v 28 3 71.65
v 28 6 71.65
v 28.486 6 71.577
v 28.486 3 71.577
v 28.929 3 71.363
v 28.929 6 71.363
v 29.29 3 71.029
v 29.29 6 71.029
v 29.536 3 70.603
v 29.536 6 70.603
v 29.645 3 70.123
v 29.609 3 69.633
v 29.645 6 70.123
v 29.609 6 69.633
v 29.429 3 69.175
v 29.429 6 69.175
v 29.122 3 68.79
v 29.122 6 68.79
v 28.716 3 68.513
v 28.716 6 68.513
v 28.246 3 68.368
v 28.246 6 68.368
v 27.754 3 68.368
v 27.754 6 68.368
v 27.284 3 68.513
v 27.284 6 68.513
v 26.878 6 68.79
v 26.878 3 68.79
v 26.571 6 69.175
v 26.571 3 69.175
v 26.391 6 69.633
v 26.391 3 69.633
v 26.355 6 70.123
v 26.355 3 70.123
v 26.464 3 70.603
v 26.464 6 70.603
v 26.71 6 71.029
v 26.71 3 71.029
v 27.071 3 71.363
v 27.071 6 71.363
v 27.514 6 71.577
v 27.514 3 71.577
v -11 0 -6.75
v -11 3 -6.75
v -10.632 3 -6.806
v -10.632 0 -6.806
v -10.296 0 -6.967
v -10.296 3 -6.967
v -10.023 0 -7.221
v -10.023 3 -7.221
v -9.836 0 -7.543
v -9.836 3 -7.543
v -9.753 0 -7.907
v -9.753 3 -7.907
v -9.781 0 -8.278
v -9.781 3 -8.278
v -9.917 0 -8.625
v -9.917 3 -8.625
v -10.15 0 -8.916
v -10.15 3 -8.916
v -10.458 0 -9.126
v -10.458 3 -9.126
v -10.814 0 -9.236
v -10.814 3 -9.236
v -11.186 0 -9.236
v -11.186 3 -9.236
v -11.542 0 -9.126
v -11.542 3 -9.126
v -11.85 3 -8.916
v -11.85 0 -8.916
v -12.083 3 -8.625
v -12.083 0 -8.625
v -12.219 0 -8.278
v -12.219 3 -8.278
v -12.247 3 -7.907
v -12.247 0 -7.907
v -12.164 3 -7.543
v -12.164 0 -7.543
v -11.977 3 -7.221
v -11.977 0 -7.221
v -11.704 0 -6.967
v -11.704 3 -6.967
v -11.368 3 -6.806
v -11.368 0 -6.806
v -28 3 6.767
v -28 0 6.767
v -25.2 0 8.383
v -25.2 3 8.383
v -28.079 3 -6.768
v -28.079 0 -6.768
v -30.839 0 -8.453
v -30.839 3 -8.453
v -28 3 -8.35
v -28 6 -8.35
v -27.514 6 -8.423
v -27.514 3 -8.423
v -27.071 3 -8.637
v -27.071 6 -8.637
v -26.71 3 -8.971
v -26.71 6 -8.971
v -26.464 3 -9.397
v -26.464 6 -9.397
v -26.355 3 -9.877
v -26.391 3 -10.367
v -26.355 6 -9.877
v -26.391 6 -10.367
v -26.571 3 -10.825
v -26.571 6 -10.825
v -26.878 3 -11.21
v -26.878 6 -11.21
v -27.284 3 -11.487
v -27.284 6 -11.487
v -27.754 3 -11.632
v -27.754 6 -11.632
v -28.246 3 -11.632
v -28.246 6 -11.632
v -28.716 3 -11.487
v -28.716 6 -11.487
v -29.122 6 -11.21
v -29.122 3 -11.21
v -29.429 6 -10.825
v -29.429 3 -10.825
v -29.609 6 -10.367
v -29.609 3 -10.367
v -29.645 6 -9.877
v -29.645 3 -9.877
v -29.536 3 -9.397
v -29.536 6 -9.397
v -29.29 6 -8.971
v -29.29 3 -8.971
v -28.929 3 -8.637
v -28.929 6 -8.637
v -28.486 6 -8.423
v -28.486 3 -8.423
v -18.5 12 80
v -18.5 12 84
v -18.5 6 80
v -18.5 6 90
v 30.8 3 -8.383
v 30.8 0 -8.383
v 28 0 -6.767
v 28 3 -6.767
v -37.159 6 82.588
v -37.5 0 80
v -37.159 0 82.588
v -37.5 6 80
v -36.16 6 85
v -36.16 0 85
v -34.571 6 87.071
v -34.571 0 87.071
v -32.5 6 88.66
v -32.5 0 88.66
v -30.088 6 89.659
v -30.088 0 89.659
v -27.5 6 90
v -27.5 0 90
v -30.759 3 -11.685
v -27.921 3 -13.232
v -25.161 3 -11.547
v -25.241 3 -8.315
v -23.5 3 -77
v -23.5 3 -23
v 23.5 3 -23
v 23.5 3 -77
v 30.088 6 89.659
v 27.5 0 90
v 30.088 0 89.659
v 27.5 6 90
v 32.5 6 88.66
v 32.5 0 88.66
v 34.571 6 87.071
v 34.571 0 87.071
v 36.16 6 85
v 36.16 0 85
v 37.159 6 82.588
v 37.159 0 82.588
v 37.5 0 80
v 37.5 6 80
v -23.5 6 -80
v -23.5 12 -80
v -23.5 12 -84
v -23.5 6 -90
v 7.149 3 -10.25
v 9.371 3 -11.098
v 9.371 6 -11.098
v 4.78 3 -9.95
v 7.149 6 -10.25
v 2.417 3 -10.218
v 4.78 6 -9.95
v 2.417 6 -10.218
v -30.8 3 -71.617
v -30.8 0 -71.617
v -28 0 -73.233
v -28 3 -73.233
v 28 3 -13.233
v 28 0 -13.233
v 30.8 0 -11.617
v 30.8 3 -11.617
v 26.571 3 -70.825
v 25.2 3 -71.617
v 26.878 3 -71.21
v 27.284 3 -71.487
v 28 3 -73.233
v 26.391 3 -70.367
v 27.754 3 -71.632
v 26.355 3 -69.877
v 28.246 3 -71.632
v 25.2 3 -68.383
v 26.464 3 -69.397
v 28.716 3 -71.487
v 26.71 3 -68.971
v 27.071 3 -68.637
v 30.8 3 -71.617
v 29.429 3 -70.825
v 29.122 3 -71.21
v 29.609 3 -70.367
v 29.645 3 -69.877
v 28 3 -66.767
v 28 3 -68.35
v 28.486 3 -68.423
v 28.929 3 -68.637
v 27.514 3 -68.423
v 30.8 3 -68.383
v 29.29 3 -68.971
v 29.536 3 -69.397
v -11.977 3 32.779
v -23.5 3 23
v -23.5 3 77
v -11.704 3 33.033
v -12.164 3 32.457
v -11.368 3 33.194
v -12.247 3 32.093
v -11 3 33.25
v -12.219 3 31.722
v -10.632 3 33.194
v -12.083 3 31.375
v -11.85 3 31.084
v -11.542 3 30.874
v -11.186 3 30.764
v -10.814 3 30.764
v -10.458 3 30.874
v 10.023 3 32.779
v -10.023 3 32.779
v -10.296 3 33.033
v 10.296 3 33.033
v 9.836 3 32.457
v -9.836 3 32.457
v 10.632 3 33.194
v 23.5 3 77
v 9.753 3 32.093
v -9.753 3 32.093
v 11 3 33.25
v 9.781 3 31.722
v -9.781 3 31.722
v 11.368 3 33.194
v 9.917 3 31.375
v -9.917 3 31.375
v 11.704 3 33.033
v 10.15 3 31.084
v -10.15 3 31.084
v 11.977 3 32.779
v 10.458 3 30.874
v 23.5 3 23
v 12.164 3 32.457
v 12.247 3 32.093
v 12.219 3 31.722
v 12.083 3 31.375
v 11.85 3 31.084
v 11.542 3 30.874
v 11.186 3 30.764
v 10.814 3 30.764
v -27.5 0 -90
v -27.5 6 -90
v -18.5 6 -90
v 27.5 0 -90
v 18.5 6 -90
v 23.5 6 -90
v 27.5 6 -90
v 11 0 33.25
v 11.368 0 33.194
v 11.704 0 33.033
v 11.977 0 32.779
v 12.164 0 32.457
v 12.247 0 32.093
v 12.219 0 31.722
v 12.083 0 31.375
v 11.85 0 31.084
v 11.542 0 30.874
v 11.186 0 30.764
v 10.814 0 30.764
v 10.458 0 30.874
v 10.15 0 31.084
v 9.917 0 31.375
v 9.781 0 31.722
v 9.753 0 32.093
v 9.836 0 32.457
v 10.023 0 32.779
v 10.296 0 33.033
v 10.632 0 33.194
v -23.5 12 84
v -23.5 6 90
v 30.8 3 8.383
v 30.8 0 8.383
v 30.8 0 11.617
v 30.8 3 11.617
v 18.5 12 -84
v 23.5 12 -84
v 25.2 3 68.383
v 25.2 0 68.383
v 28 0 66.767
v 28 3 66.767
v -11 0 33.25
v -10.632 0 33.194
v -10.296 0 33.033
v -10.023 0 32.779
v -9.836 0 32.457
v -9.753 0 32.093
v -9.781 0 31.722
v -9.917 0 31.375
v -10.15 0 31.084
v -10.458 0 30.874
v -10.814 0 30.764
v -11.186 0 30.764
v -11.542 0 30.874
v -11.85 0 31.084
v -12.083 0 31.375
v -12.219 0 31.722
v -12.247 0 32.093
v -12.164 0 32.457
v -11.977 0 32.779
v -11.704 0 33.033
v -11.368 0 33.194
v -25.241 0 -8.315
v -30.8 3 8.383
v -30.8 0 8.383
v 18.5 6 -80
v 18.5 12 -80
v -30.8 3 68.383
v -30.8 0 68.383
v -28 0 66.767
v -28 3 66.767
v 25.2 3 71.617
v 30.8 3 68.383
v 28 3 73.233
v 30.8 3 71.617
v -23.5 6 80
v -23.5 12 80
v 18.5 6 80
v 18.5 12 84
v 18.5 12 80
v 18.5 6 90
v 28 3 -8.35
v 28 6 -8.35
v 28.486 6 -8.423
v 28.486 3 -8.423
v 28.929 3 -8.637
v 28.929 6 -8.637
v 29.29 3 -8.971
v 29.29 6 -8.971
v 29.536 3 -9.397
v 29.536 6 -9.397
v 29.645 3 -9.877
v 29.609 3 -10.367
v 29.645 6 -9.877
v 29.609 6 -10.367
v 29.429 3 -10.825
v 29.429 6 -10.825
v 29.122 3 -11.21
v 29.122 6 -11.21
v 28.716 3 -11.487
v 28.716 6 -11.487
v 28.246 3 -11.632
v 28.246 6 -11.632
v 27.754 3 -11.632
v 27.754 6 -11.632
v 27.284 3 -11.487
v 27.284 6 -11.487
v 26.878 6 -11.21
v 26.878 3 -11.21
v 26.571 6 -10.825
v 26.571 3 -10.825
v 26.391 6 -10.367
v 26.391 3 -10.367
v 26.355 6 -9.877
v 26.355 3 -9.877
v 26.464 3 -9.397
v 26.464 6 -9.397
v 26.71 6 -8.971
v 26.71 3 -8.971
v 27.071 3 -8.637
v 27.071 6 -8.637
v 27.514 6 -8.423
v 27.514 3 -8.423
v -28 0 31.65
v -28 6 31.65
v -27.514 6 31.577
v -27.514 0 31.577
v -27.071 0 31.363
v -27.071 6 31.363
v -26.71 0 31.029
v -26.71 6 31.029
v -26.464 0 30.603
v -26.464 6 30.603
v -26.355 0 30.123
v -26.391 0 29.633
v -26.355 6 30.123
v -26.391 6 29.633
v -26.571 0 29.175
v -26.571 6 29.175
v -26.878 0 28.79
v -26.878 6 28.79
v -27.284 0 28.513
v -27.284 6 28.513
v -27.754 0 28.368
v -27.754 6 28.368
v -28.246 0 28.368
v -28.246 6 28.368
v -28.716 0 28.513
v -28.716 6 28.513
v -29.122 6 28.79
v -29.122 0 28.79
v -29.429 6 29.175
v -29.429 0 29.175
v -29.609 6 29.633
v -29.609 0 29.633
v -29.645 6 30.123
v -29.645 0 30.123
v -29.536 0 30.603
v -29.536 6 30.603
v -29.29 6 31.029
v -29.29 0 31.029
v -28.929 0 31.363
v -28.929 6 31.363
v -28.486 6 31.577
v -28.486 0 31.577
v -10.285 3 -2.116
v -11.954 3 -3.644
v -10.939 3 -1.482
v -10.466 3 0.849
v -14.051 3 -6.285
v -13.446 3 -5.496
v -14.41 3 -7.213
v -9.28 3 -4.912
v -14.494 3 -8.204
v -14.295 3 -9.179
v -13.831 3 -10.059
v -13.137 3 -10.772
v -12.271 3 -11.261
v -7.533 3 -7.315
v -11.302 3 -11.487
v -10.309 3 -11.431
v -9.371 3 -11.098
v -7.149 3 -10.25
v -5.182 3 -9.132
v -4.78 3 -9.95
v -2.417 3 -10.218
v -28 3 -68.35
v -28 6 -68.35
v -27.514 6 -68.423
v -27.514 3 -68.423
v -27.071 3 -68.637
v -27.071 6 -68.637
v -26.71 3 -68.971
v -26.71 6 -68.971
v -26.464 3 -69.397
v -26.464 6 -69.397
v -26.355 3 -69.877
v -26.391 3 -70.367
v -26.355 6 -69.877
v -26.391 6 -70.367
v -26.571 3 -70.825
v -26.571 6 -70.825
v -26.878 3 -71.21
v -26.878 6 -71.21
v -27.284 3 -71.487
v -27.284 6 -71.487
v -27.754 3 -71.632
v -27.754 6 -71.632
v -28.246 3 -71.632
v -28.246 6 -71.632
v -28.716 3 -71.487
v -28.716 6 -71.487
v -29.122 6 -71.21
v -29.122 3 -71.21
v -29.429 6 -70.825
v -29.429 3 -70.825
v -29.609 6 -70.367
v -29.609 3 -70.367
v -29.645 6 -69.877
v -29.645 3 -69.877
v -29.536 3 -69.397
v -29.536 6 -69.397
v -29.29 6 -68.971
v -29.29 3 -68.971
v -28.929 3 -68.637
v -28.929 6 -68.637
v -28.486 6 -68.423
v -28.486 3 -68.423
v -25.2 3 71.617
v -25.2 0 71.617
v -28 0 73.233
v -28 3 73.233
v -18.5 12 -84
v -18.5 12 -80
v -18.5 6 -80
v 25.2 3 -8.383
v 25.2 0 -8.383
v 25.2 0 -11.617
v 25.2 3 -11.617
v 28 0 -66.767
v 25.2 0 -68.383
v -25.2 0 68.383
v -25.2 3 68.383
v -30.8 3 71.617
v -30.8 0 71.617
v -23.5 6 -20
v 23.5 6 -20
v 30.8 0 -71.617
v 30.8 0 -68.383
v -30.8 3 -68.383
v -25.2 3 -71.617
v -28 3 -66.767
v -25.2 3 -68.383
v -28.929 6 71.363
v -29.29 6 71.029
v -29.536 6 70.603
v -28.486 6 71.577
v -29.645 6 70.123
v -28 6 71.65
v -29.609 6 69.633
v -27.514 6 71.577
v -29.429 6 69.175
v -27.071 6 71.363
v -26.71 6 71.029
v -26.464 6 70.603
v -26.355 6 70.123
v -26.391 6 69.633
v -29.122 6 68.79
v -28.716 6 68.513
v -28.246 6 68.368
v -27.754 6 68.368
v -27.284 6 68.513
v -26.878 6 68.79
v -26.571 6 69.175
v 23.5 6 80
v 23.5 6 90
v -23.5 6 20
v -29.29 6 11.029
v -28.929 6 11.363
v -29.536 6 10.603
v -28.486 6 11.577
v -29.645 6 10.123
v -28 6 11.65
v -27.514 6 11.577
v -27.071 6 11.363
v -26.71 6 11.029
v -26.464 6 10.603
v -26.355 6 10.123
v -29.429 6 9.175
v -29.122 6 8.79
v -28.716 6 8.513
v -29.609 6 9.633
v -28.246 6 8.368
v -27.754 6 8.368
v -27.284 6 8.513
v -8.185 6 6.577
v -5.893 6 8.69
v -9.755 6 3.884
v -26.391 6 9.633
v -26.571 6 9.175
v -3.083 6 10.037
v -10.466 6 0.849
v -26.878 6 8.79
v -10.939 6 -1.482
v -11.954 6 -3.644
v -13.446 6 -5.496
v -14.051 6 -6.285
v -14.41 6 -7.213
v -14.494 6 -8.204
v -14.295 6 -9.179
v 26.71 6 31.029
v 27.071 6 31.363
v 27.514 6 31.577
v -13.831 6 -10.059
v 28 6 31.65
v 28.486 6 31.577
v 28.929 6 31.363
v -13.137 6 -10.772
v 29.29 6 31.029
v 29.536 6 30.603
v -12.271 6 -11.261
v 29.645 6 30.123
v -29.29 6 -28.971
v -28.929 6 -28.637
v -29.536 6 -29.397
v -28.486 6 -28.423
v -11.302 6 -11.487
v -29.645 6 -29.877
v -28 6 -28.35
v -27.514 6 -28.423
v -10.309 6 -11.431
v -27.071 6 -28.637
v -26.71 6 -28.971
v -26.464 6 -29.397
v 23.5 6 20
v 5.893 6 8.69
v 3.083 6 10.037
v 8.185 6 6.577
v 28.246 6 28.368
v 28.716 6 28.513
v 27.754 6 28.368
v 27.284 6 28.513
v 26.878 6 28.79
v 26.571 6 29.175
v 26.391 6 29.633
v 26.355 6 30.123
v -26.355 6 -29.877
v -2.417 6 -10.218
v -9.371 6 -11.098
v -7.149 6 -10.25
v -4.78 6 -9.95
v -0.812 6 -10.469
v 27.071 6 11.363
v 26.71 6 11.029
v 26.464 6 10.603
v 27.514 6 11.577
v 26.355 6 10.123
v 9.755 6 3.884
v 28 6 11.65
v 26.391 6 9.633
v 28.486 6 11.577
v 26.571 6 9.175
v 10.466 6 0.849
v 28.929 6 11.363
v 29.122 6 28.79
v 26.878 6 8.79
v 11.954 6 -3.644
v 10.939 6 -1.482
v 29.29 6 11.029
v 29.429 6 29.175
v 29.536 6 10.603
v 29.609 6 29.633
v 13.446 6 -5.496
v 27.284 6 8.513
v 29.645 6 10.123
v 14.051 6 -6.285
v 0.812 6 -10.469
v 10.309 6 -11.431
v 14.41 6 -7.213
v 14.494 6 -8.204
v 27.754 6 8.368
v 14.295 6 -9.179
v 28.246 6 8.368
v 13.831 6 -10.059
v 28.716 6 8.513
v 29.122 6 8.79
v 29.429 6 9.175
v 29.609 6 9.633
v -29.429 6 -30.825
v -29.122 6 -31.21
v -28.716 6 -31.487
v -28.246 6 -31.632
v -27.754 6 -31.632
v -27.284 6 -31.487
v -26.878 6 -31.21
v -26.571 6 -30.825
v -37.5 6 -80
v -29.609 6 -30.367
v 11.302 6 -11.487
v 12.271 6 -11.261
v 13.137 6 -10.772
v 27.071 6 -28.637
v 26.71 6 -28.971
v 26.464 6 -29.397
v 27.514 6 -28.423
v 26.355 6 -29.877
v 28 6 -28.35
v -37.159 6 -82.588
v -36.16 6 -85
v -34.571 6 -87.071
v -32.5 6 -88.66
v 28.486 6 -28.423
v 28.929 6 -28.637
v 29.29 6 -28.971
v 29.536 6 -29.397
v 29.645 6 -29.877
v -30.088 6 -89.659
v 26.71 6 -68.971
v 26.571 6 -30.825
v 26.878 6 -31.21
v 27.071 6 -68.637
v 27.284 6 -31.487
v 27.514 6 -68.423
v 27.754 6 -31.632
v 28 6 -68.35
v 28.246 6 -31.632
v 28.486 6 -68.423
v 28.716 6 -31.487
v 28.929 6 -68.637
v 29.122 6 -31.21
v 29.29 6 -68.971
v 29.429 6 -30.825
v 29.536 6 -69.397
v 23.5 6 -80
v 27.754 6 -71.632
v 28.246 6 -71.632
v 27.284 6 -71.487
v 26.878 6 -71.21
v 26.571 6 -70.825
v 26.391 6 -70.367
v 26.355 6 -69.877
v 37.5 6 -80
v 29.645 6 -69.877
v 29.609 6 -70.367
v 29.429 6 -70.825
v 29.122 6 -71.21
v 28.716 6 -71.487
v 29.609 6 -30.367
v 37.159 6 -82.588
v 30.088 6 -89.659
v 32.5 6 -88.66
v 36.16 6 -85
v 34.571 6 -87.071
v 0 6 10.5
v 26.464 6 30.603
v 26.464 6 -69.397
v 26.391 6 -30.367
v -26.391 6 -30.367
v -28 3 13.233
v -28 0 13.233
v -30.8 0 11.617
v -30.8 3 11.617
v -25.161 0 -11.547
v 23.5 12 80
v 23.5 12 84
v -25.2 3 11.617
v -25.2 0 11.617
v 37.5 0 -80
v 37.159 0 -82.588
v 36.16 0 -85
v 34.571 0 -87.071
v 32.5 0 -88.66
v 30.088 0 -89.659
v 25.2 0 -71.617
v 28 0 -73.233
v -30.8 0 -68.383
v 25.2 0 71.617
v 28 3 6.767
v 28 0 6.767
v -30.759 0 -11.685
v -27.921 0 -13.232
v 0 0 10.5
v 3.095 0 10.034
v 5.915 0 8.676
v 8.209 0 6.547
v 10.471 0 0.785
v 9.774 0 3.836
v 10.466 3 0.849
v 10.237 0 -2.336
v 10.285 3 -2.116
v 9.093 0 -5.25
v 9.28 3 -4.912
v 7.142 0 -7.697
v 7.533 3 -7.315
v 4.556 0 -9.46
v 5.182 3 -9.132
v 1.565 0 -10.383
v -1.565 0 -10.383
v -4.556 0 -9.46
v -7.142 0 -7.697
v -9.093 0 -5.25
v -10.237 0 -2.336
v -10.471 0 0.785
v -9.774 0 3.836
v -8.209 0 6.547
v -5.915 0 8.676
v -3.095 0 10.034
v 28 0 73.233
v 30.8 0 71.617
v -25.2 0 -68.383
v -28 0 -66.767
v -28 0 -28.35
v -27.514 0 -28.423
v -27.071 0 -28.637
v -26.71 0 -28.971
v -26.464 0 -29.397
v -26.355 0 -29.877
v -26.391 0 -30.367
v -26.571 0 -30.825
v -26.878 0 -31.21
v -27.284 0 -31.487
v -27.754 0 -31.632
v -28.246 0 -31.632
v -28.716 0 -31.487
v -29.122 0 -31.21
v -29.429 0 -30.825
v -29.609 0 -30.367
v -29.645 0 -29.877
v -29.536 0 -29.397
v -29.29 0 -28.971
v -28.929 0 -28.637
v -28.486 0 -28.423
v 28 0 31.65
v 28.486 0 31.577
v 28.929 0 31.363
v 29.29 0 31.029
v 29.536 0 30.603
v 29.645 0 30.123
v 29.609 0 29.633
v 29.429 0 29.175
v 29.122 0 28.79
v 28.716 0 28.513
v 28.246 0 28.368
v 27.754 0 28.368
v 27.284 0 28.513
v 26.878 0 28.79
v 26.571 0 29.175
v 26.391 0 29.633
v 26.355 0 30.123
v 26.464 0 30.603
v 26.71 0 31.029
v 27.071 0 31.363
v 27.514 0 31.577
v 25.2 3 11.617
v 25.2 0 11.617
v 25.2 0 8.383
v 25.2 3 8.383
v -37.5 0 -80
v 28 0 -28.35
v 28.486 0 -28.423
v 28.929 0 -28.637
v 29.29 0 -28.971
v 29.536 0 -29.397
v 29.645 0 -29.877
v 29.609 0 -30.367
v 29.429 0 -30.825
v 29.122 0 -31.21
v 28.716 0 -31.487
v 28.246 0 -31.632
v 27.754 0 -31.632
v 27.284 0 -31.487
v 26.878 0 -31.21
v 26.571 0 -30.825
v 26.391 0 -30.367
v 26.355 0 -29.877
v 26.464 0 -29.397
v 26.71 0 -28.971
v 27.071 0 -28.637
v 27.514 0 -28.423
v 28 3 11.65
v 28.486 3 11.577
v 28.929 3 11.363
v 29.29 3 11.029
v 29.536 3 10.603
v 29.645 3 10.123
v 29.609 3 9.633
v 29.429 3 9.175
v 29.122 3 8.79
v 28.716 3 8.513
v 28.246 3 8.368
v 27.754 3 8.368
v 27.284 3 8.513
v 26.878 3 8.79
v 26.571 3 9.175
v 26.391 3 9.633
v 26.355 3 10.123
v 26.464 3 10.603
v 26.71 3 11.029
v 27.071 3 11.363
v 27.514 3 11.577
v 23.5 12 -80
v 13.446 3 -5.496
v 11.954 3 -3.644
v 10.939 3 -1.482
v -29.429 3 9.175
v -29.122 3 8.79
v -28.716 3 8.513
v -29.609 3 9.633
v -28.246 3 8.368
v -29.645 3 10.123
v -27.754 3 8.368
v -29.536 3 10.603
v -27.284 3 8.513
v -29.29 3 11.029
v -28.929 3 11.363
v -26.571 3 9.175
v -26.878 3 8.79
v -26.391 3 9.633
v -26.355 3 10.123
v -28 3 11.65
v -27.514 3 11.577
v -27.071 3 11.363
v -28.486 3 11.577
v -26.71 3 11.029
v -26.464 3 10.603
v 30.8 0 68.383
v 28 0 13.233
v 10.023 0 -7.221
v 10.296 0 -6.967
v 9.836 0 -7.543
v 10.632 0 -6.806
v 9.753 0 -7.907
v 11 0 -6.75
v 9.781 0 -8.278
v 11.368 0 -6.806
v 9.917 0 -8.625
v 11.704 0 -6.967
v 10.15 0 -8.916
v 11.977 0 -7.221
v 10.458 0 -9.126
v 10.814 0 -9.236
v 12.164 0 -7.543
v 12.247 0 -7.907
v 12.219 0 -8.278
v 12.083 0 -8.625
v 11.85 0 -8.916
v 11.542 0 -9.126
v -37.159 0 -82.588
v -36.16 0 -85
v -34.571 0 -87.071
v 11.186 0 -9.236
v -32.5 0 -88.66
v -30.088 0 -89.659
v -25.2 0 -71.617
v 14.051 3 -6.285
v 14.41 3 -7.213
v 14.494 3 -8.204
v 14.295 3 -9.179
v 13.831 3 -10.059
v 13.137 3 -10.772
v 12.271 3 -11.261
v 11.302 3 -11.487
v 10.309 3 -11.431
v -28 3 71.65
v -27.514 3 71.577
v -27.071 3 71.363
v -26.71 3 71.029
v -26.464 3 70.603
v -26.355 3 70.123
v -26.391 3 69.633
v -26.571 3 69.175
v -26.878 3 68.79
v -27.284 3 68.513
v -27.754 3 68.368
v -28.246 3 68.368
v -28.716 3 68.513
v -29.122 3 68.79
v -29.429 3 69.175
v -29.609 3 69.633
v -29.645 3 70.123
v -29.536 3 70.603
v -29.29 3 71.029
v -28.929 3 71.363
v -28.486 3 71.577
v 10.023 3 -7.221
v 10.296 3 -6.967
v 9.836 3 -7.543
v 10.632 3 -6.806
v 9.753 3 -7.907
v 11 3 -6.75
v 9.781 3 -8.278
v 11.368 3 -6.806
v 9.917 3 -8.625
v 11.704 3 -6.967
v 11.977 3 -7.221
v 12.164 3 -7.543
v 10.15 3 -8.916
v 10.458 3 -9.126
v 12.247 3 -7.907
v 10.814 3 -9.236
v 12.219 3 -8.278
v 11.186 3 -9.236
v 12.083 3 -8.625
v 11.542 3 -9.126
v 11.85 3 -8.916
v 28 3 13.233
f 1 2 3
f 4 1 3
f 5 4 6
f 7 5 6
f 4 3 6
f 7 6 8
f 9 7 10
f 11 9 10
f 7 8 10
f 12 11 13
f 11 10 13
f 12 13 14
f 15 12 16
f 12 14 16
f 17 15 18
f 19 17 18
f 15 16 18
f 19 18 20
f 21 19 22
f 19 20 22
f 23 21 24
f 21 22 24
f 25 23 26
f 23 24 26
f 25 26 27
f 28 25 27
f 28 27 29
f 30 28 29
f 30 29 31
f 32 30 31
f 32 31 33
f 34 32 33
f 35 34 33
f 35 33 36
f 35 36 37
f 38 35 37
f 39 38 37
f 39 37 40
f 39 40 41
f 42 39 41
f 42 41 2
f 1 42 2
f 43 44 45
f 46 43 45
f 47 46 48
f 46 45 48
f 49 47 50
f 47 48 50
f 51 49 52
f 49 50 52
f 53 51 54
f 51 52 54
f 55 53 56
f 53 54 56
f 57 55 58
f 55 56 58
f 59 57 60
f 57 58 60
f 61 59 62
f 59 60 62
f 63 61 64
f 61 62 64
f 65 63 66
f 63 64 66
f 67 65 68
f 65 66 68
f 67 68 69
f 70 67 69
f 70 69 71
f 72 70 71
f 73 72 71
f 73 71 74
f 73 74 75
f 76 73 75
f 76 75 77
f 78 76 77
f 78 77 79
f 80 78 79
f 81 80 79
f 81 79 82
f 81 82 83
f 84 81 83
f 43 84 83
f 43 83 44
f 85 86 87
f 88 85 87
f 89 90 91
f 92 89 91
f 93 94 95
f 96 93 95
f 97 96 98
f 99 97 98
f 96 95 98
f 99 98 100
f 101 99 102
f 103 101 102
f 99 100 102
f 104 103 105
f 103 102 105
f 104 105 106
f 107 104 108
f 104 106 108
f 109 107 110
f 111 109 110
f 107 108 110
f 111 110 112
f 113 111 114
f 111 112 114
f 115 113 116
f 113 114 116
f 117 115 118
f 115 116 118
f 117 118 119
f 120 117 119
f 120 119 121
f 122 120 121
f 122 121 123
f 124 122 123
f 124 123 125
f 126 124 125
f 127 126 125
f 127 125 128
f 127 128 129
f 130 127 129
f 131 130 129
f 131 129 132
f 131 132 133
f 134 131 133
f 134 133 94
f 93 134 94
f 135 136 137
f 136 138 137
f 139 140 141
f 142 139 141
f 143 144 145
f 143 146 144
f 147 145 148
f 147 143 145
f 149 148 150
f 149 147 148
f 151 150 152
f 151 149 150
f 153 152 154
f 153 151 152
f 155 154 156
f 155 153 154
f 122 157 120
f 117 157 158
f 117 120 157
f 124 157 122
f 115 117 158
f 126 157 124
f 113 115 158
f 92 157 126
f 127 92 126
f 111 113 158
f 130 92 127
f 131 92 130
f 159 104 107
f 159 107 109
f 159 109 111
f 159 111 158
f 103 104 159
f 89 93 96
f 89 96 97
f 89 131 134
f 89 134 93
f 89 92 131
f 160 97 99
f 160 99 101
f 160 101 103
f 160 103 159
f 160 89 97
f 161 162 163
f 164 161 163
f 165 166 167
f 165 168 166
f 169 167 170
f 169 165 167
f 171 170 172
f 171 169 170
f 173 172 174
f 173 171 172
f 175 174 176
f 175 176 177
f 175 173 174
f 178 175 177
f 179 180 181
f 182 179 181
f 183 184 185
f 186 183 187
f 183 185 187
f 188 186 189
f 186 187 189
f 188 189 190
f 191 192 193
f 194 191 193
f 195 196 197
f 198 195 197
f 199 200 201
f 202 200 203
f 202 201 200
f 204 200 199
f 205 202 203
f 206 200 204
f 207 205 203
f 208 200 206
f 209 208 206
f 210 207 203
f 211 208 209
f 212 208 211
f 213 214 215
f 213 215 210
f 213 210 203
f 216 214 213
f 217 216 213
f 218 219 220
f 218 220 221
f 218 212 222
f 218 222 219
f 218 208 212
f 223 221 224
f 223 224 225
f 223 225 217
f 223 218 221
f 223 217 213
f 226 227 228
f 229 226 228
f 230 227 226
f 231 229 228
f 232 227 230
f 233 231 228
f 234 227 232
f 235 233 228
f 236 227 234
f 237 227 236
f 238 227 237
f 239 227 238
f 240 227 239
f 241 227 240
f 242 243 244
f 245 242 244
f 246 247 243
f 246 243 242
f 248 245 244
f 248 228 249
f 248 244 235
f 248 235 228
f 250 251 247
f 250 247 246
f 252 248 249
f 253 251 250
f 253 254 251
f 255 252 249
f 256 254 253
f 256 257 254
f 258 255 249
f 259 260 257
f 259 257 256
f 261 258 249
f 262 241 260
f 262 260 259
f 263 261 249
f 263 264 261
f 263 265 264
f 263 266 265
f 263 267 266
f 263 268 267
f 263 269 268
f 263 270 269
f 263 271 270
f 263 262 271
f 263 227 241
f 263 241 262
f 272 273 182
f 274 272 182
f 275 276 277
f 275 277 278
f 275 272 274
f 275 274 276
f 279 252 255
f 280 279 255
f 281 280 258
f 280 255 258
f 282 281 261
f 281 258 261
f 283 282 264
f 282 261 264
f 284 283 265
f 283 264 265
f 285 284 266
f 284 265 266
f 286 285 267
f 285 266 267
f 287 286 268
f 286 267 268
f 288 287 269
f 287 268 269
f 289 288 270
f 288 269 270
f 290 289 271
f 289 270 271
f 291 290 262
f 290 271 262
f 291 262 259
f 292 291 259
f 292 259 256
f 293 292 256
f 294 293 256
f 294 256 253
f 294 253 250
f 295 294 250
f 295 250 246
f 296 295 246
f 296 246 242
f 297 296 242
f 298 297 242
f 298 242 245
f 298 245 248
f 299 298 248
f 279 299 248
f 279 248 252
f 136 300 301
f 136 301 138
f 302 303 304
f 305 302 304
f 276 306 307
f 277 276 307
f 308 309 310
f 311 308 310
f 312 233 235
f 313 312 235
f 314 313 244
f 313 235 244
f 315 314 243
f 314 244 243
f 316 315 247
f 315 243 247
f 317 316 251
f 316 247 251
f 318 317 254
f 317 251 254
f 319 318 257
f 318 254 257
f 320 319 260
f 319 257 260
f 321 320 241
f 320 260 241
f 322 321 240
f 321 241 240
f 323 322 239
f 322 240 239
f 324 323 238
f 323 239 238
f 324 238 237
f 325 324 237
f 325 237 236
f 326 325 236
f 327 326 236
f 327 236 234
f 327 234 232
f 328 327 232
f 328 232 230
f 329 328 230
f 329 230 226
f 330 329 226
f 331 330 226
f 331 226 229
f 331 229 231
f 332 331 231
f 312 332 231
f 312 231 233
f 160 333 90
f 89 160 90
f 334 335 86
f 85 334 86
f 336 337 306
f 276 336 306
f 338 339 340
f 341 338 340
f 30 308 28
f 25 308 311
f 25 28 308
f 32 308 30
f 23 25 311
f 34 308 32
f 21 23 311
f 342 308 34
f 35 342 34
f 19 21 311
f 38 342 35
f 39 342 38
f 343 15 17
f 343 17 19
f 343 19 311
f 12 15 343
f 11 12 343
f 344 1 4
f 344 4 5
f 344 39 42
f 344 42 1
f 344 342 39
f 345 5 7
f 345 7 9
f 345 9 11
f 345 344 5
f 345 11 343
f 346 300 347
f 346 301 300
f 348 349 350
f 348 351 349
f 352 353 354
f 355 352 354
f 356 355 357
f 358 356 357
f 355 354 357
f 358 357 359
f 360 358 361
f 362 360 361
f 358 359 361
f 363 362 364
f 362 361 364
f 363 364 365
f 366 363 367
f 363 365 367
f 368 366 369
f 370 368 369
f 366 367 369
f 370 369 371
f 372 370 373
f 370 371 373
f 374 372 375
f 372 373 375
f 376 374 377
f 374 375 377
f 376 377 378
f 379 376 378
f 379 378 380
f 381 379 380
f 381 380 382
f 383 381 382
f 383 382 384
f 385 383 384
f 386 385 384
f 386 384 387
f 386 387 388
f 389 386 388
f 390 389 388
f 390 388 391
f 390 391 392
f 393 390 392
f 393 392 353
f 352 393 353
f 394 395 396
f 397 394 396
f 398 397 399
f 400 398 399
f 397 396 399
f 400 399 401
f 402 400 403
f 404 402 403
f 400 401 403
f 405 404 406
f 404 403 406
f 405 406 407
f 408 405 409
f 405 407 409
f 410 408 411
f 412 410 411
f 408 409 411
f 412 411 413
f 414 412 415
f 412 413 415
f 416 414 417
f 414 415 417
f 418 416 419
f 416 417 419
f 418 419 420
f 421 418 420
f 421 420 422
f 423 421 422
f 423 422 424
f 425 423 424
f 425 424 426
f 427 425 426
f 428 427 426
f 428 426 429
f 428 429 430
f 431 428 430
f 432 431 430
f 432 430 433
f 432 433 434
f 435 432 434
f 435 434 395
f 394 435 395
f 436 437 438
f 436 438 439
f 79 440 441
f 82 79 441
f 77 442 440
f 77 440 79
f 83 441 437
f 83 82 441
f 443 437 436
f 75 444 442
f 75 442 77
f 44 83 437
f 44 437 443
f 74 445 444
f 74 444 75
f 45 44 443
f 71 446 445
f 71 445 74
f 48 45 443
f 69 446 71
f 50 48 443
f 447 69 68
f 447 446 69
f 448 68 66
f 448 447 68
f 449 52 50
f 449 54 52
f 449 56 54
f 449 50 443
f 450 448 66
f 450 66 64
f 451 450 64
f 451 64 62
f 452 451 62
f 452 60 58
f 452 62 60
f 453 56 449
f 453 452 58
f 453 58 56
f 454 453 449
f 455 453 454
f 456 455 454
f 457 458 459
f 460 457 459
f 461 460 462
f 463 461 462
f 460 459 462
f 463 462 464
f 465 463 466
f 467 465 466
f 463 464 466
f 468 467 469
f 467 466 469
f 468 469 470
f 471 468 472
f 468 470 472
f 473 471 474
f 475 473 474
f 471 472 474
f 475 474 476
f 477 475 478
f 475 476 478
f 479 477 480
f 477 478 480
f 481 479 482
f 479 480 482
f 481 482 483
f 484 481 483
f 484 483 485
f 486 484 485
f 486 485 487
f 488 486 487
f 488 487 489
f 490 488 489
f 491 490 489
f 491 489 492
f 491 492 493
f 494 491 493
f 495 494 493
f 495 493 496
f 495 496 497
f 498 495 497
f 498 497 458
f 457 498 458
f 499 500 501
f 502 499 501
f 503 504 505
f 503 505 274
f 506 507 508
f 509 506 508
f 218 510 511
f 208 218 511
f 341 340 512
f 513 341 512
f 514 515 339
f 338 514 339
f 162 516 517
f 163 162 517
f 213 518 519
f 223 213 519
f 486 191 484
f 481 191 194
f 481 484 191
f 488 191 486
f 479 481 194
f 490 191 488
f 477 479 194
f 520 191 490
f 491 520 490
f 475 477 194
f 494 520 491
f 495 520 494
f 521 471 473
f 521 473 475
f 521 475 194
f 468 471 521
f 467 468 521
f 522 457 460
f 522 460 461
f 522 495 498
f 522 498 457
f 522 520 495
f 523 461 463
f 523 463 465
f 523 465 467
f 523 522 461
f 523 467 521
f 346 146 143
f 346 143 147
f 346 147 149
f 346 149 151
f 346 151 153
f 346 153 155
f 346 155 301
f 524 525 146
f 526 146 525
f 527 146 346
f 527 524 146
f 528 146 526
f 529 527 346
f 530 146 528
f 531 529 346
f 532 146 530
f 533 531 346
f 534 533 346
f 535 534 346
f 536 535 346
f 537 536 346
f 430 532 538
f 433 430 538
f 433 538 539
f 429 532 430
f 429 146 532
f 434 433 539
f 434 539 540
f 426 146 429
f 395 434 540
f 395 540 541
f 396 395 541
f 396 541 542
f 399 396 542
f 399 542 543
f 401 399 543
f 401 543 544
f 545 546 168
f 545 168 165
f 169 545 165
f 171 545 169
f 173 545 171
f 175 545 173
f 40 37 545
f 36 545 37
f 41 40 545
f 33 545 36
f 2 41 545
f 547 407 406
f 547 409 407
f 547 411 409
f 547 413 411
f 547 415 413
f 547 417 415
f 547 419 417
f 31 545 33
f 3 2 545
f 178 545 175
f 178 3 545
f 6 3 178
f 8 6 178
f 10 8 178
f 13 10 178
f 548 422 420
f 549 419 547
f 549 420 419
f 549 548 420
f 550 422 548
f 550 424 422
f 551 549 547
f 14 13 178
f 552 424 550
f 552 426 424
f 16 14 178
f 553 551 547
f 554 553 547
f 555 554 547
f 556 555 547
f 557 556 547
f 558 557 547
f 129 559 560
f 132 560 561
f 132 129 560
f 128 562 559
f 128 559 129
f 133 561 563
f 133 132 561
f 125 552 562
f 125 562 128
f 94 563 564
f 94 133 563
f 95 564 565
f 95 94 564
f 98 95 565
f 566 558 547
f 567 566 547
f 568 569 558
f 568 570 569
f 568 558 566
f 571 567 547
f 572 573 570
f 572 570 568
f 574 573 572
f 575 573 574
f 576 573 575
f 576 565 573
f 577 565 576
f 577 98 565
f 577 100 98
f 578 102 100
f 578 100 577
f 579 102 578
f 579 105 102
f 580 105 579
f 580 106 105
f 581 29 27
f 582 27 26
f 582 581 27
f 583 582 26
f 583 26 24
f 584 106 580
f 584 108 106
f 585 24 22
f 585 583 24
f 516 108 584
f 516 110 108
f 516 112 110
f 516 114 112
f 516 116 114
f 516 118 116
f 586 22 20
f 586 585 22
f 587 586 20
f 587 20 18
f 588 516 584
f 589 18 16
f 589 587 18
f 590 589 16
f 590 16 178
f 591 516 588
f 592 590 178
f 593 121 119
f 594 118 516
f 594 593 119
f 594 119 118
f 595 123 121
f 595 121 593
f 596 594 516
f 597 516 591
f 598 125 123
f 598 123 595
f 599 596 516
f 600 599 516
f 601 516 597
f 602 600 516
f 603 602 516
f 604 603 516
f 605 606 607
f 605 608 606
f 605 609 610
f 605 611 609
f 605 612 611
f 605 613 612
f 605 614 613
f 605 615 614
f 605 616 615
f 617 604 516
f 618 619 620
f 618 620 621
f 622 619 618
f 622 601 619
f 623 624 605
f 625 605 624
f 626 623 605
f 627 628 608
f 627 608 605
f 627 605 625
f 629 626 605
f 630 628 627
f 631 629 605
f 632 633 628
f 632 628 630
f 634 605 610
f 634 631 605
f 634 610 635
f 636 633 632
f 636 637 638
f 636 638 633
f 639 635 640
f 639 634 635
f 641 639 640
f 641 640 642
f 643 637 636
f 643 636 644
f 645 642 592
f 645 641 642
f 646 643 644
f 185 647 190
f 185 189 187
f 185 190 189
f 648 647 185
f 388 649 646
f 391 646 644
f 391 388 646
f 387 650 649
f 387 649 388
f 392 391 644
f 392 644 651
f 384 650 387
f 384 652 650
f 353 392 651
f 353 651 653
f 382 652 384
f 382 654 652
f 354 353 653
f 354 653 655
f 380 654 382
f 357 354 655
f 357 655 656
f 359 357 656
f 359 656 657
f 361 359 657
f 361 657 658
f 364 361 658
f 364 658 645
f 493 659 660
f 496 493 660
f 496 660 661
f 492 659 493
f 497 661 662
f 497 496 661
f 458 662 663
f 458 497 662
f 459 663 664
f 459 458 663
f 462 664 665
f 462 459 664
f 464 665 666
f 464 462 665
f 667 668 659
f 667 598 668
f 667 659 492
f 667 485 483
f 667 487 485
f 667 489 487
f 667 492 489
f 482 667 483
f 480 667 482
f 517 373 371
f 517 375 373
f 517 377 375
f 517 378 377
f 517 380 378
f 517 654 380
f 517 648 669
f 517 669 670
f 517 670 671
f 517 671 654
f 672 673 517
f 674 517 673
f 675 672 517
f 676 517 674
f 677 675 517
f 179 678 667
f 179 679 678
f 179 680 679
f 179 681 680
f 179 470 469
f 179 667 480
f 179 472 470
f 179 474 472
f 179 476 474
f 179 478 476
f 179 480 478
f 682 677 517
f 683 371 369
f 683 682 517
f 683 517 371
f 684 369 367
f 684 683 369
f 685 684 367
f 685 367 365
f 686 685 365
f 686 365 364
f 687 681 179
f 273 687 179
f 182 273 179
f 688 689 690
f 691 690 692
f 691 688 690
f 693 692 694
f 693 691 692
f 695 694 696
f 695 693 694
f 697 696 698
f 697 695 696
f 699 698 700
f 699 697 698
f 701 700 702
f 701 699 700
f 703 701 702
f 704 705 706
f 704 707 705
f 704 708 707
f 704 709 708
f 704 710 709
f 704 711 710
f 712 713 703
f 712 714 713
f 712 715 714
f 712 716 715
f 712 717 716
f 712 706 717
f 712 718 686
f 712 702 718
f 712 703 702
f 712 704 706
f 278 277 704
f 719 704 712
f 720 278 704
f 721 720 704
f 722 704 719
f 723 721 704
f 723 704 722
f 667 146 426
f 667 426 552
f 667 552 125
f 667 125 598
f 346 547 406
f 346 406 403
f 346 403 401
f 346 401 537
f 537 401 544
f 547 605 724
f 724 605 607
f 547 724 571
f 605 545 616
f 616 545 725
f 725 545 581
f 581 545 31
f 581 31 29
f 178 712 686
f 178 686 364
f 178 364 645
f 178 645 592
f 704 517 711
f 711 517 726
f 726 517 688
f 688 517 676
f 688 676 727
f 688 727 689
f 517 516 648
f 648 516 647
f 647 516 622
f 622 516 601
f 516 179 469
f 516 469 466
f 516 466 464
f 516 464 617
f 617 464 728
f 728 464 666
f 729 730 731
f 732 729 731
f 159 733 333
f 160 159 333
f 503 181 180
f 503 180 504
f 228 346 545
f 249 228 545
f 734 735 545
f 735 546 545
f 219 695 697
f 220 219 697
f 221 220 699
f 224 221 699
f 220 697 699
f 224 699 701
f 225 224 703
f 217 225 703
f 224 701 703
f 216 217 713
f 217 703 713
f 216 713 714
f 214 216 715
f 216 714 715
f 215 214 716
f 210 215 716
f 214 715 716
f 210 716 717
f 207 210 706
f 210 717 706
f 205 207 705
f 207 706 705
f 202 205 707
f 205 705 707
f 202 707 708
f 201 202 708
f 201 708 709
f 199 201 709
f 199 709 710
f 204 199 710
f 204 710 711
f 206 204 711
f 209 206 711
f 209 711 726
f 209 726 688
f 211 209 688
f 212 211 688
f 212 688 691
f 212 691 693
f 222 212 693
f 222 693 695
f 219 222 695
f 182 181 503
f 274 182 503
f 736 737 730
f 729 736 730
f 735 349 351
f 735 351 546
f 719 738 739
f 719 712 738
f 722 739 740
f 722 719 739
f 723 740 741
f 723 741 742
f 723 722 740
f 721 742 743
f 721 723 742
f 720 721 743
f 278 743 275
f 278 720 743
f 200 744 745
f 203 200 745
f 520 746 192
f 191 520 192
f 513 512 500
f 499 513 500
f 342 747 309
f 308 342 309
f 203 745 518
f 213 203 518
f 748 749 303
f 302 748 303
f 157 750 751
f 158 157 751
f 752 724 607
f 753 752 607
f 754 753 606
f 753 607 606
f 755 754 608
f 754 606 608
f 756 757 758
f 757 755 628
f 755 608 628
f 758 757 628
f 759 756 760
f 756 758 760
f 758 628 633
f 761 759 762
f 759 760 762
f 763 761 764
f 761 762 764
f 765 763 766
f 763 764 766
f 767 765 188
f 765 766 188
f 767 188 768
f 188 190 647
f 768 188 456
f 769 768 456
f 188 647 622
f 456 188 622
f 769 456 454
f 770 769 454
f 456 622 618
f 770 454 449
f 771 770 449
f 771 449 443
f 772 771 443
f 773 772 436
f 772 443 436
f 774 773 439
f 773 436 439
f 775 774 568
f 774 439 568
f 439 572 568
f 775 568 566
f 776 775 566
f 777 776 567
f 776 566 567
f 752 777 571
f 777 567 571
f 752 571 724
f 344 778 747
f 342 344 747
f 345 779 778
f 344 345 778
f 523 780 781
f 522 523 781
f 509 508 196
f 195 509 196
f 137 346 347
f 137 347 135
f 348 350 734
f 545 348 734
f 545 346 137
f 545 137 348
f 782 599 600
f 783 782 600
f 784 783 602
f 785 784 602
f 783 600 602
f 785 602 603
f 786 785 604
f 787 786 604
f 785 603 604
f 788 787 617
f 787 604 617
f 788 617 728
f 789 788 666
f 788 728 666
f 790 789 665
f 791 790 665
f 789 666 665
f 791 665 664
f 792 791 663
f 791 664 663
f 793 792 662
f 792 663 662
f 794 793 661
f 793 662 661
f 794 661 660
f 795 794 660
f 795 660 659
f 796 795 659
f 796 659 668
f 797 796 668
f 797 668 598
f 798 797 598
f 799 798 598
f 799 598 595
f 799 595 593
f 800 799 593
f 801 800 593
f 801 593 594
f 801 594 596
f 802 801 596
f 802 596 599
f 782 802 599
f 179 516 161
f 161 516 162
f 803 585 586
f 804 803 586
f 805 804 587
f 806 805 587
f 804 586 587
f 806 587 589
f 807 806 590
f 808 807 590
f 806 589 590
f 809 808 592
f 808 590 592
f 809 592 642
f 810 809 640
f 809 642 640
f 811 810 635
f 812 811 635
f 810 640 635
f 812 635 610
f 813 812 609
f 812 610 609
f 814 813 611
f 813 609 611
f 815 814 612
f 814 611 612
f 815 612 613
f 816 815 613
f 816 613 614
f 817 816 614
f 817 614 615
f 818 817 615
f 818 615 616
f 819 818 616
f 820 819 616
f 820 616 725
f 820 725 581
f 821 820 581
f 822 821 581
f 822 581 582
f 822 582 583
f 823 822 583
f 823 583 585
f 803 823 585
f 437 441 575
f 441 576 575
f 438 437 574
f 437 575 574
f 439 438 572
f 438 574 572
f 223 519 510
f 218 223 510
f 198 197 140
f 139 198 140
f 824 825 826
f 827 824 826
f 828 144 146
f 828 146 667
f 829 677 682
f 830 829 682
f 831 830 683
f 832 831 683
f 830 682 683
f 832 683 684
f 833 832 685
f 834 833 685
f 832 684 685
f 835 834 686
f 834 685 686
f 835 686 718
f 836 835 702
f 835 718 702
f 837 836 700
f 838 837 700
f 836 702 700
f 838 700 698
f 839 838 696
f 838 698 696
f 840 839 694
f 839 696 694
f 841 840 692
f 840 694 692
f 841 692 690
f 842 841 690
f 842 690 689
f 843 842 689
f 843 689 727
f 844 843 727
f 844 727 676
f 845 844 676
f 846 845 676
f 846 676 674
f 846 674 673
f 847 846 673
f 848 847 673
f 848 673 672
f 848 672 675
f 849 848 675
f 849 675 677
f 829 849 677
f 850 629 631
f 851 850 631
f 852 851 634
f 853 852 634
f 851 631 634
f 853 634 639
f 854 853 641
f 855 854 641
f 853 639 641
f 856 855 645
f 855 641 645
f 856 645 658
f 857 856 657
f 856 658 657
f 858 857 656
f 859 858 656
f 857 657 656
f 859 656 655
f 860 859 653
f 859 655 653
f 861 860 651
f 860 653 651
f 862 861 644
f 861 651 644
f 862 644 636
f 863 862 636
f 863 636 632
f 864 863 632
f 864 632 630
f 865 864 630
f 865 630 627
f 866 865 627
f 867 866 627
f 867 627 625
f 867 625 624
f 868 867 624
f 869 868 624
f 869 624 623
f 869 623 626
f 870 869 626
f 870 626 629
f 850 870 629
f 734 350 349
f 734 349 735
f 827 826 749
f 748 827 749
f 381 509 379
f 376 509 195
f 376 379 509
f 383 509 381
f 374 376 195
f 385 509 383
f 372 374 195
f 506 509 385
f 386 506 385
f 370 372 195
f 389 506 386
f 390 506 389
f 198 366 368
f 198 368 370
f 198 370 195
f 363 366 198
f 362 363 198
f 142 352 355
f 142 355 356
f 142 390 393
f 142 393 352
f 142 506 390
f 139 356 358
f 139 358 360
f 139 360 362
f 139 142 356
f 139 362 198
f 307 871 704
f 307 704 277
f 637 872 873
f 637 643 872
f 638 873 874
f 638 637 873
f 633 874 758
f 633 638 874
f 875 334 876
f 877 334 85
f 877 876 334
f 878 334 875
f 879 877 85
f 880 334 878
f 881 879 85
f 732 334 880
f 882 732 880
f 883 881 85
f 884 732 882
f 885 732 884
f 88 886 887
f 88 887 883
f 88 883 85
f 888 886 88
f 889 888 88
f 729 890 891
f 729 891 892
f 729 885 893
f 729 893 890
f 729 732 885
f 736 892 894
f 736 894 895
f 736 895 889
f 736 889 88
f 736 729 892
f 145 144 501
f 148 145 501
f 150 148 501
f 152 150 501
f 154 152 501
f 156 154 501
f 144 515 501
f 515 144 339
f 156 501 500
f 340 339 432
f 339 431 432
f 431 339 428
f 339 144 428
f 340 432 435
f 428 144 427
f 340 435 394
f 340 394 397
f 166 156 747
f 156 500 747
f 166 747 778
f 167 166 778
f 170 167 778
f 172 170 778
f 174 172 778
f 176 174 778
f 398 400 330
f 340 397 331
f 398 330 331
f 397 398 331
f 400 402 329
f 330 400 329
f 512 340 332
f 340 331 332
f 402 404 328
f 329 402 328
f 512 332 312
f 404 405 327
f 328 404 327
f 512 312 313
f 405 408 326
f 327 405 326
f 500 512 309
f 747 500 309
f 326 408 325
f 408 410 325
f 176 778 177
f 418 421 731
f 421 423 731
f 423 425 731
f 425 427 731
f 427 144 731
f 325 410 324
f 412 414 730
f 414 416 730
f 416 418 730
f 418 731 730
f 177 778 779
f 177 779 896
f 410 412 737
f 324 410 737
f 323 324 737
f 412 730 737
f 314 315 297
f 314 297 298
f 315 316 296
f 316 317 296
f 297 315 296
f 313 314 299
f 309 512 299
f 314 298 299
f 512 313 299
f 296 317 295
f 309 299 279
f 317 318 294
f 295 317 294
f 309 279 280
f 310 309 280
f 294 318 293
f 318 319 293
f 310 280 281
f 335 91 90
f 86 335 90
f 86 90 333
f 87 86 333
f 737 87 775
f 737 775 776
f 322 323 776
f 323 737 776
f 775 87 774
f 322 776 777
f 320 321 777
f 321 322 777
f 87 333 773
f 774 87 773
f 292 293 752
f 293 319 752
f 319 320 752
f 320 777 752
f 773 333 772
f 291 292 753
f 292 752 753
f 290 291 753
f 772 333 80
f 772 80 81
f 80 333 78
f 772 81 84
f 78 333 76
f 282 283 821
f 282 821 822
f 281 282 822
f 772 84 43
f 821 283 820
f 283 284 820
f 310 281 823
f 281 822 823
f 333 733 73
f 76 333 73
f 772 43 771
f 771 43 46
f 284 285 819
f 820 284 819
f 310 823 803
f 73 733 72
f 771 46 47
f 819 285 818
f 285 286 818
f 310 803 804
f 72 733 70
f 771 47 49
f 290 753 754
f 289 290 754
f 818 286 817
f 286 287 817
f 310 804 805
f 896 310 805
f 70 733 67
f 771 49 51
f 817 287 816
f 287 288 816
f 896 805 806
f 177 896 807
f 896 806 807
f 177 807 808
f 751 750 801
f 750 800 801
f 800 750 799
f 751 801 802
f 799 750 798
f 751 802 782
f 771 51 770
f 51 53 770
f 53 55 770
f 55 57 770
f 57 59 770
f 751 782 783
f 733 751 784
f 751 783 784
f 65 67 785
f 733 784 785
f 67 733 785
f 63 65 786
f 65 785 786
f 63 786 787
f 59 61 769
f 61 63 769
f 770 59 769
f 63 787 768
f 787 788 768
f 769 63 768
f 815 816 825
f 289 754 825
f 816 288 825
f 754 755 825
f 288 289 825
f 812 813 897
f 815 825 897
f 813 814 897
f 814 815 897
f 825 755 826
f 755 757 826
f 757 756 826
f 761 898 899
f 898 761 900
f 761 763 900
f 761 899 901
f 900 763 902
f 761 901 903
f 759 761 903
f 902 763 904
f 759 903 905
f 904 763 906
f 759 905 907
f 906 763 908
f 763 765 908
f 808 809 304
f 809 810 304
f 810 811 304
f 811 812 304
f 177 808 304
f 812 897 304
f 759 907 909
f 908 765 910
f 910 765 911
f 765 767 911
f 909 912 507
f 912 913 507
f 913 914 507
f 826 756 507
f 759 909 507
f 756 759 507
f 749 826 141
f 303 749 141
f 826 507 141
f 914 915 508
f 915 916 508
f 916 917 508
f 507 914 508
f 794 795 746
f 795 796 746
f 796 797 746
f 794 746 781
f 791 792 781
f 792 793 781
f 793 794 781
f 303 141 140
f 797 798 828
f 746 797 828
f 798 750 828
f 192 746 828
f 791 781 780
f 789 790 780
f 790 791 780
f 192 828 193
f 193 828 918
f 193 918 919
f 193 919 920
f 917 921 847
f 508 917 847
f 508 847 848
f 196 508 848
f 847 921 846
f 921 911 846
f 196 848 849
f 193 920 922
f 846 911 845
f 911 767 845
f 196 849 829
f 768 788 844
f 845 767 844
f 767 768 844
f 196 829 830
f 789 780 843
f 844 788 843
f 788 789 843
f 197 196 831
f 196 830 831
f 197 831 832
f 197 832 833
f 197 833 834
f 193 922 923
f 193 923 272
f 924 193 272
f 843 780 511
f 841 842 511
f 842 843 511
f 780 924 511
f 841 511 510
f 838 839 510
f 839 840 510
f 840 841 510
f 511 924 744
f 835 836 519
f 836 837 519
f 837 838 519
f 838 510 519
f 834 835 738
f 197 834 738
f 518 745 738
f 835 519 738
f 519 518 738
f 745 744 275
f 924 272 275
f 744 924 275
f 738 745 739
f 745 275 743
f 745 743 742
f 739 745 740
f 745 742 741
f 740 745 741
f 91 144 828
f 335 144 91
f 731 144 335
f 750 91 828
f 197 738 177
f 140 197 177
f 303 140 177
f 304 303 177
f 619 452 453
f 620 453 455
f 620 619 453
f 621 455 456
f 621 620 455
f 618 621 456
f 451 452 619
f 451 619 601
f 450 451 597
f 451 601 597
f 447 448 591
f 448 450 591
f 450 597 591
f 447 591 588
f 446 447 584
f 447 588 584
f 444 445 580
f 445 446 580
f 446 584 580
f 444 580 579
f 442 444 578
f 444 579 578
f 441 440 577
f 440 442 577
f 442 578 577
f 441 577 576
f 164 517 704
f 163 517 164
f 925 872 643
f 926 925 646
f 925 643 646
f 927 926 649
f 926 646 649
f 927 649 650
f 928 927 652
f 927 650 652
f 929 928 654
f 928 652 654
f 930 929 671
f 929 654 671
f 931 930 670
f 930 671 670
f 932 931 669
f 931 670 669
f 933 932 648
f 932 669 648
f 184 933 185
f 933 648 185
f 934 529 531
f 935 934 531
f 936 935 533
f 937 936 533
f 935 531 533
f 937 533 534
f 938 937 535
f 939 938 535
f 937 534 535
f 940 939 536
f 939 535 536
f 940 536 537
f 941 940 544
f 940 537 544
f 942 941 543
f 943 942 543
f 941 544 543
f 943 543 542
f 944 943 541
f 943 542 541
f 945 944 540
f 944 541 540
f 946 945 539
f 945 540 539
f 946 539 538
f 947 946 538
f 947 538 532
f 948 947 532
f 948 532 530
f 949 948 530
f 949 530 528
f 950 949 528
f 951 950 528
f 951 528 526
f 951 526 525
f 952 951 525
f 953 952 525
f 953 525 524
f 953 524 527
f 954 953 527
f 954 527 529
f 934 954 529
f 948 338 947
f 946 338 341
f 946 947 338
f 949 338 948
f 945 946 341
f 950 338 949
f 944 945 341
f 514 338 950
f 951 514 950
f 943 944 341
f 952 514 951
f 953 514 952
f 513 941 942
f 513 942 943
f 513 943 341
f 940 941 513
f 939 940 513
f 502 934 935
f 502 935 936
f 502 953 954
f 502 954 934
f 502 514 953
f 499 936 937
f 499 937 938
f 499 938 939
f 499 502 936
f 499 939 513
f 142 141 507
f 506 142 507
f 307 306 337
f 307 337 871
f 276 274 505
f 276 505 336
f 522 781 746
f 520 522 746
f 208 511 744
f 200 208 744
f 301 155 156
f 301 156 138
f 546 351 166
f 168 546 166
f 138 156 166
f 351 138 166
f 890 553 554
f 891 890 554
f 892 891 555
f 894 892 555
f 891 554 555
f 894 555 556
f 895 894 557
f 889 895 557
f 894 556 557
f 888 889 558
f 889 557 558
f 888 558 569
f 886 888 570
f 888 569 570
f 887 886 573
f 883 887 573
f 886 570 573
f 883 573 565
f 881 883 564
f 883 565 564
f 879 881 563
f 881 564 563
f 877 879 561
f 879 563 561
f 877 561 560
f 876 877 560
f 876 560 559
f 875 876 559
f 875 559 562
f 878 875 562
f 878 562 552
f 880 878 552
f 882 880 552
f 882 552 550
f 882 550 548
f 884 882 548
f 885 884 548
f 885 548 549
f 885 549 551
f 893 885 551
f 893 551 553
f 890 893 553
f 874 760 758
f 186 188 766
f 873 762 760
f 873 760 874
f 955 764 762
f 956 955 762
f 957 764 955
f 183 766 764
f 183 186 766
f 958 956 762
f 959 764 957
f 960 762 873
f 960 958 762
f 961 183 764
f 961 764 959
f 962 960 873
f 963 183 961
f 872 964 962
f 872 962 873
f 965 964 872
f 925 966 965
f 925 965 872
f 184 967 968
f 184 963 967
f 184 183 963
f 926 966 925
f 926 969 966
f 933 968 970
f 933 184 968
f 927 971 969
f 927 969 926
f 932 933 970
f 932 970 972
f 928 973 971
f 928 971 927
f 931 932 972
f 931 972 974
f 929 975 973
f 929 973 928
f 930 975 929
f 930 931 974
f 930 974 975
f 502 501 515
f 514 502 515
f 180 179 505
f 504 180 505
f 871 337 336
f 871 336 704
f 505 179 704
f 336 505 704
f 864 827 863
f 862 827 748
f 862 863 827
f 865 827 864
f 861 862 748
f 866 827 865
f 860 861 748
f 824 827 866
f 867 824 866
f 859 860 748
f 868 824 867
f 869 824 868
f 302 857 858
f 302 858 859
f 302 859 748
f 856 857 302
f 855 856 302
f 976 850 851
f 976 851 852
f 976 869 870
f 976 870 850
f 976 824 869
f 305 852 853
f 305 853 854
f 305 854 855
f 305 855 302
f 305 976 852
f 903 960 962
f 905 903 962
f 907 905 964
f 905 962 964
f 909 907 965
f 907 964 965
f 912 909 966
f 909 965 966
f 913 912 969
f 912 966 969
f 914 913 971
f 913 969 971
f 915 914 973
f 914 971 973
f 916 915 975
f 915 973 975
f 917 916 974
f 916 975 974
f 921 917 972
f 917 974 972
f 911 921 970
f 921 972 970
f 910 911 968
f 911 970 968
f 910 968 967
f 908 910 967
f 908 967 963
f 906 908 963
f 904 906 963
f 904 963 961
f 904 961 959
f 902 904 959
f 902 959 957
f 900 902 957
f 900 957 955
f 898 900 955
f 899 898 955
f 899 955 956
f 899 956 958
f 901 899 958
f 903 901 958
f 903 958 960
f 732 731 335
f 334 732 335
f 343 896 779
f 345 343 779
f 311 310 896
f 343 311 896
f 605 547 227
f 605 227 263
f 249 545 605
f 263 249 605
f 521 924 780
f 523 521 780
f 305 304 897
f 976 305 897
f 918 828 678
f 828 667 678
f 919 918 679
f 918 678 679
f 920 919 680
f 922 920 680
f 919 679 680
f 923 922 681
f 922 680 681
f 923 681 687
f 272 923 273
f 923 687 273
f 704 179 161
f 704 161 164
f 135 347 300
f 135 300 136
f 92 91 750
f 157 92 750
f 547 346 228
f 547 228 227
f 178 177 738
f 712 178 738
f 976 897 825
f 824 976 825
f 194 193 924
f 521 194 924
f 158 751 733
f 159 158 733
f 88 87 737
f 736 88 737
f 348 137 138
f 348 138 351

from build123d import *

# Parameters (mm, degrees)
SKETCH1_W           = 75
SKETCH1_H           = 180
BOSS_EXTRUDE1_DEPTH = 6
FILLET1_R           = 10
SKETCH2_R           = 10.5
SKETCH2_R_2         = 1.25
SKETCH2_R_3         = 1.65
CUT_EXTRUDE1_DEPTH  = 10
CUT_EXTRUDE2_DEPTH  = 3
SKETCH5_R           = 3.5
SKETCH5_W           = 47
SKETCH5_H           = 60
CUT_EXTRUDE3_DEPTH  = 3
FILLET2_R           = 10
CHAMFER1_SIZE       = 3
SKETCH6_W           = 5
SKETCH6_H           = 10
BOSS_EXTRUDE2_DEPTH = 6
CHAMFER2_SIZE       = 6


with BuildPart() as part:
    # Sketch1 → Boss-Extrude1 (new body)
    with BuildSketch(Plane(origin=(0, 0, 0), x_dir=(1, 0, 0), z_dir=(0, 1, 0))):
        Rectangle(SKETCH1_W, SKETCH1_H)
    extrude(amount=BOSS_EXTRUDE1_DEPTH)

    # Fillet1
    fillet1_edges = [part.edges().sort_by_distance(p)[0] for p in [
        (-37.5, 3, -90),
        (37.5, 3, -90),
        (37.5, 3, 90),
        (-37.5, 3, 90),
    ]]
    fillet(fillet1_edges, radius=FILLET1_R)

    # Sketch2 → Cut-Extrude1 (cut)
    with BuildSketch(Plane(origin=(0, 6, 0), x_dir=(1, 0, 0), z_dir=(0, 1, 0))):
        with Locations(Location((0, 0, 0), (0, 0, 270))):
            Circle(SKETCH2_R)
        with Locations(Location((-11, 8, 0), (0, 0, 270))):
            Circle(SKETCH2_R_2)
        with Locations(Location((11, 8, 0), (0, 0, 270))):
            Circle(SKETCH2_R_2)
        with Locations(Location((-11, -32, 0), (0, 0, 270))):
            Circle(SKETCH2_R_2)
        with Locations(Location((11, -32, 0), (0, 0, 270))):
            Circle(SKETCH2_R_2)
        with Locations(Location((-28, -70, 0), (0, 0, 270))):
            Circle(SKETCH2_R_3)
        with Locations(Location((28, -70, 0), (0, 0, 270))):
            Circle(SKETCH2_R_3)
        with Locations(Location((-28, 70, 0), (0, 0, 270))):
            Circle(SKETCH2_R_3)
        with Locations(Location((28, 70, 0), (0, 0, 270))):
            Circle(SKETCH2_R_3)
        with Locations(Location((-28, 10, 0), (0, 0, 270))):
            Circle(SKETCH2_R_3)
        with Locations(Location((-28, -10, 0), (0, 0, 270))):
            Circle(SKETCH2_R_3)
        with Locations(Location((28, 10, 0), (0, 0, 270))):
            Circle(SKETCH2_R_3)
        with Locations(Location((28, -10, 0), (0, 0, 270))):
            Circle(SKETCH2_R_3)
        with Locations(Location((-28, 30, 0), (0, 0, 270))):
            Circle(SKETCH2_R_3)
        with Locations(Location((28, 30, 0), (0, 0, 270))):
            Circle(SKETCH2_R_3)
        with Locations(Location((28, -30, 0), (0, 0, 270))):
            Circle(SKETCH2_R_3)
        with Locations(Location((-28, -30, 0), (0, 0, 270))):
            Circle(SKETCH2_R_3)
    extrude(amount=-CUT_EXTRUDE1_DEPTH, mode=Mode.SUBTRACT)

    # Sketch4 → Cut-Extrude2 (cut)
    with BuildSketch(Plane.XZ):
        Polygon((-28, 6.766838493), (-25.2, 8.383419246), (-25.2, 11.616580754), (-28, 13.233161507), (-30.8, 11.616580754), (-30.8, 8.383419246), align=None)
        Polygon((-27.920583163, -13.232185994), (-25.161136401, -11.547315999), (-25.240553238, -8.315130005), (-28.079416837, -6.767814006), (-30.838863599, -8.452684001), (-30.759446762, -11.684869995), align=None)
        Polygon((28, -13.233161507), (30.8, -11.616580754), (30.8, -8.383419246), (28, -6.766838493), (25.2, -8.383419246), (25.2, -11.616580754), align=None)
        Polygon((28, 6.766838493), (30.8, 8.383419246), (30.8, 11.616580754), (28, 13.233161507), (25.2, 11.616580754), (25.2, 8.383419246), align=None)
        Polygon((28, 66.766838493), (30.8, 68.383419246), (30.8, 71.616580754), (28, 73.233161507), (25.2, 71.616580754), (25.2, 68.383419246), align=None)
        Polygon((-28, 66.766838493), (-25.2, 68.383419246), (-25.2, 71.616580754), (-28, 73.233161507), (-30.8, 71.616580754), (-30.8, 68.383419246), align=None)
        Polygon((28, -73.233161507), (30.8, -71.616580754), (30.8, -68.383419246), (28, -66.766838493), (25.2, -68.383419246), (25.2, -71.616580754), align=None)
        Polygon((-28, -73.233161507), (-25.2, -71.616580754), (-25.2, -68.383419246), (-28, -66.766838493), (-30.8, -68.383419246), (-30.8, -71.616580754), align=None)
    extrude(amount=-CUT_EXTRUDE2_DEPTH, mode=Mode.SUBTRACT)

    # Sketch5 → Cut-Extrude3 (cut)
    with BuildSketch(Plane(origin=(0, 6, 0), x_dir=(1, 0, 0), z_dir=(0, 1, 0))):
        with Locations((-11, 8)):
            Circle(SKETCH5_R)
        with Locations((11, 8)):
            Circle(SKETCH5_R)
        with Locations((0, 50)):
            Rectangle(SKETCH5_W, SKETCH5_H)
        with Locations((0, -50)):
            Rectangle(SKETCH5_W, SKETCH5_H)
    extrude(amount=-CUT_EXTRUDE3_DEPTH, mode=Mode.SUBTRACT)

    # Fillet2
    fillet2_edges = [part.edges().sort_by_distance(p)[0] for p in [
        (-7.57722899, 4.5, -7.268810139),
        (-9.249798037, 4.5, -4.969027699),
        (9.249798037, 4.5, -4.969027699),
        (7.57722899, 4.5, -7.268810139),
    ]]
    fillet(fillet2_edges, radius=FILLET2_R)

    # Chamfer1
    chamfer1_edges = [part.edges().sort_by_distance(p)[0] for p in [
        (0, 3, 80),
        (0, 3, -80),
        (0, 3, -20),
        (0, 3, 20),
    ]]
    chamfer(chamfer1_edges, length=CHAMFER1_SIZE - 0.0001)  # a hair under: the kernel refuses the full size

    # Sketch6 → Boss-Extrude2 (add)
    with BuildSketch(Plane(origin=(0, 6, 0), x_dir=(1, 0, 0), z_dir=(0, 1, 0))):
        with Locations((-21, 85)):
            Rectangle(SKETCH6_W, SKETCH6_H)
        with Locations((21, -85)):
            Rectangle(SKETCH6_W, SKETCH6_H)
        with Locations((21, 85)):
            Rectangle(SKETCH6_W, SKETCH6_H)
        with Locations((-21, -85)):
            Rectangle(SKETCH6_W, SKETCH6_H)
    extrude(amount=BOSS_EXTRUDE2_DEPTH)

    # Chamfer2
    chamfer2_edges = [part.edges().sort_by_distance(p)[0] for p in [
        (21, 12, 90),
        (-21, 12, -90),
        (21, 12, -90),
        (-21, 12, 90),
    ]]
    chamfer(chamfer2_edges, length=CHAMFER2_SIZE)


solid = part.part
